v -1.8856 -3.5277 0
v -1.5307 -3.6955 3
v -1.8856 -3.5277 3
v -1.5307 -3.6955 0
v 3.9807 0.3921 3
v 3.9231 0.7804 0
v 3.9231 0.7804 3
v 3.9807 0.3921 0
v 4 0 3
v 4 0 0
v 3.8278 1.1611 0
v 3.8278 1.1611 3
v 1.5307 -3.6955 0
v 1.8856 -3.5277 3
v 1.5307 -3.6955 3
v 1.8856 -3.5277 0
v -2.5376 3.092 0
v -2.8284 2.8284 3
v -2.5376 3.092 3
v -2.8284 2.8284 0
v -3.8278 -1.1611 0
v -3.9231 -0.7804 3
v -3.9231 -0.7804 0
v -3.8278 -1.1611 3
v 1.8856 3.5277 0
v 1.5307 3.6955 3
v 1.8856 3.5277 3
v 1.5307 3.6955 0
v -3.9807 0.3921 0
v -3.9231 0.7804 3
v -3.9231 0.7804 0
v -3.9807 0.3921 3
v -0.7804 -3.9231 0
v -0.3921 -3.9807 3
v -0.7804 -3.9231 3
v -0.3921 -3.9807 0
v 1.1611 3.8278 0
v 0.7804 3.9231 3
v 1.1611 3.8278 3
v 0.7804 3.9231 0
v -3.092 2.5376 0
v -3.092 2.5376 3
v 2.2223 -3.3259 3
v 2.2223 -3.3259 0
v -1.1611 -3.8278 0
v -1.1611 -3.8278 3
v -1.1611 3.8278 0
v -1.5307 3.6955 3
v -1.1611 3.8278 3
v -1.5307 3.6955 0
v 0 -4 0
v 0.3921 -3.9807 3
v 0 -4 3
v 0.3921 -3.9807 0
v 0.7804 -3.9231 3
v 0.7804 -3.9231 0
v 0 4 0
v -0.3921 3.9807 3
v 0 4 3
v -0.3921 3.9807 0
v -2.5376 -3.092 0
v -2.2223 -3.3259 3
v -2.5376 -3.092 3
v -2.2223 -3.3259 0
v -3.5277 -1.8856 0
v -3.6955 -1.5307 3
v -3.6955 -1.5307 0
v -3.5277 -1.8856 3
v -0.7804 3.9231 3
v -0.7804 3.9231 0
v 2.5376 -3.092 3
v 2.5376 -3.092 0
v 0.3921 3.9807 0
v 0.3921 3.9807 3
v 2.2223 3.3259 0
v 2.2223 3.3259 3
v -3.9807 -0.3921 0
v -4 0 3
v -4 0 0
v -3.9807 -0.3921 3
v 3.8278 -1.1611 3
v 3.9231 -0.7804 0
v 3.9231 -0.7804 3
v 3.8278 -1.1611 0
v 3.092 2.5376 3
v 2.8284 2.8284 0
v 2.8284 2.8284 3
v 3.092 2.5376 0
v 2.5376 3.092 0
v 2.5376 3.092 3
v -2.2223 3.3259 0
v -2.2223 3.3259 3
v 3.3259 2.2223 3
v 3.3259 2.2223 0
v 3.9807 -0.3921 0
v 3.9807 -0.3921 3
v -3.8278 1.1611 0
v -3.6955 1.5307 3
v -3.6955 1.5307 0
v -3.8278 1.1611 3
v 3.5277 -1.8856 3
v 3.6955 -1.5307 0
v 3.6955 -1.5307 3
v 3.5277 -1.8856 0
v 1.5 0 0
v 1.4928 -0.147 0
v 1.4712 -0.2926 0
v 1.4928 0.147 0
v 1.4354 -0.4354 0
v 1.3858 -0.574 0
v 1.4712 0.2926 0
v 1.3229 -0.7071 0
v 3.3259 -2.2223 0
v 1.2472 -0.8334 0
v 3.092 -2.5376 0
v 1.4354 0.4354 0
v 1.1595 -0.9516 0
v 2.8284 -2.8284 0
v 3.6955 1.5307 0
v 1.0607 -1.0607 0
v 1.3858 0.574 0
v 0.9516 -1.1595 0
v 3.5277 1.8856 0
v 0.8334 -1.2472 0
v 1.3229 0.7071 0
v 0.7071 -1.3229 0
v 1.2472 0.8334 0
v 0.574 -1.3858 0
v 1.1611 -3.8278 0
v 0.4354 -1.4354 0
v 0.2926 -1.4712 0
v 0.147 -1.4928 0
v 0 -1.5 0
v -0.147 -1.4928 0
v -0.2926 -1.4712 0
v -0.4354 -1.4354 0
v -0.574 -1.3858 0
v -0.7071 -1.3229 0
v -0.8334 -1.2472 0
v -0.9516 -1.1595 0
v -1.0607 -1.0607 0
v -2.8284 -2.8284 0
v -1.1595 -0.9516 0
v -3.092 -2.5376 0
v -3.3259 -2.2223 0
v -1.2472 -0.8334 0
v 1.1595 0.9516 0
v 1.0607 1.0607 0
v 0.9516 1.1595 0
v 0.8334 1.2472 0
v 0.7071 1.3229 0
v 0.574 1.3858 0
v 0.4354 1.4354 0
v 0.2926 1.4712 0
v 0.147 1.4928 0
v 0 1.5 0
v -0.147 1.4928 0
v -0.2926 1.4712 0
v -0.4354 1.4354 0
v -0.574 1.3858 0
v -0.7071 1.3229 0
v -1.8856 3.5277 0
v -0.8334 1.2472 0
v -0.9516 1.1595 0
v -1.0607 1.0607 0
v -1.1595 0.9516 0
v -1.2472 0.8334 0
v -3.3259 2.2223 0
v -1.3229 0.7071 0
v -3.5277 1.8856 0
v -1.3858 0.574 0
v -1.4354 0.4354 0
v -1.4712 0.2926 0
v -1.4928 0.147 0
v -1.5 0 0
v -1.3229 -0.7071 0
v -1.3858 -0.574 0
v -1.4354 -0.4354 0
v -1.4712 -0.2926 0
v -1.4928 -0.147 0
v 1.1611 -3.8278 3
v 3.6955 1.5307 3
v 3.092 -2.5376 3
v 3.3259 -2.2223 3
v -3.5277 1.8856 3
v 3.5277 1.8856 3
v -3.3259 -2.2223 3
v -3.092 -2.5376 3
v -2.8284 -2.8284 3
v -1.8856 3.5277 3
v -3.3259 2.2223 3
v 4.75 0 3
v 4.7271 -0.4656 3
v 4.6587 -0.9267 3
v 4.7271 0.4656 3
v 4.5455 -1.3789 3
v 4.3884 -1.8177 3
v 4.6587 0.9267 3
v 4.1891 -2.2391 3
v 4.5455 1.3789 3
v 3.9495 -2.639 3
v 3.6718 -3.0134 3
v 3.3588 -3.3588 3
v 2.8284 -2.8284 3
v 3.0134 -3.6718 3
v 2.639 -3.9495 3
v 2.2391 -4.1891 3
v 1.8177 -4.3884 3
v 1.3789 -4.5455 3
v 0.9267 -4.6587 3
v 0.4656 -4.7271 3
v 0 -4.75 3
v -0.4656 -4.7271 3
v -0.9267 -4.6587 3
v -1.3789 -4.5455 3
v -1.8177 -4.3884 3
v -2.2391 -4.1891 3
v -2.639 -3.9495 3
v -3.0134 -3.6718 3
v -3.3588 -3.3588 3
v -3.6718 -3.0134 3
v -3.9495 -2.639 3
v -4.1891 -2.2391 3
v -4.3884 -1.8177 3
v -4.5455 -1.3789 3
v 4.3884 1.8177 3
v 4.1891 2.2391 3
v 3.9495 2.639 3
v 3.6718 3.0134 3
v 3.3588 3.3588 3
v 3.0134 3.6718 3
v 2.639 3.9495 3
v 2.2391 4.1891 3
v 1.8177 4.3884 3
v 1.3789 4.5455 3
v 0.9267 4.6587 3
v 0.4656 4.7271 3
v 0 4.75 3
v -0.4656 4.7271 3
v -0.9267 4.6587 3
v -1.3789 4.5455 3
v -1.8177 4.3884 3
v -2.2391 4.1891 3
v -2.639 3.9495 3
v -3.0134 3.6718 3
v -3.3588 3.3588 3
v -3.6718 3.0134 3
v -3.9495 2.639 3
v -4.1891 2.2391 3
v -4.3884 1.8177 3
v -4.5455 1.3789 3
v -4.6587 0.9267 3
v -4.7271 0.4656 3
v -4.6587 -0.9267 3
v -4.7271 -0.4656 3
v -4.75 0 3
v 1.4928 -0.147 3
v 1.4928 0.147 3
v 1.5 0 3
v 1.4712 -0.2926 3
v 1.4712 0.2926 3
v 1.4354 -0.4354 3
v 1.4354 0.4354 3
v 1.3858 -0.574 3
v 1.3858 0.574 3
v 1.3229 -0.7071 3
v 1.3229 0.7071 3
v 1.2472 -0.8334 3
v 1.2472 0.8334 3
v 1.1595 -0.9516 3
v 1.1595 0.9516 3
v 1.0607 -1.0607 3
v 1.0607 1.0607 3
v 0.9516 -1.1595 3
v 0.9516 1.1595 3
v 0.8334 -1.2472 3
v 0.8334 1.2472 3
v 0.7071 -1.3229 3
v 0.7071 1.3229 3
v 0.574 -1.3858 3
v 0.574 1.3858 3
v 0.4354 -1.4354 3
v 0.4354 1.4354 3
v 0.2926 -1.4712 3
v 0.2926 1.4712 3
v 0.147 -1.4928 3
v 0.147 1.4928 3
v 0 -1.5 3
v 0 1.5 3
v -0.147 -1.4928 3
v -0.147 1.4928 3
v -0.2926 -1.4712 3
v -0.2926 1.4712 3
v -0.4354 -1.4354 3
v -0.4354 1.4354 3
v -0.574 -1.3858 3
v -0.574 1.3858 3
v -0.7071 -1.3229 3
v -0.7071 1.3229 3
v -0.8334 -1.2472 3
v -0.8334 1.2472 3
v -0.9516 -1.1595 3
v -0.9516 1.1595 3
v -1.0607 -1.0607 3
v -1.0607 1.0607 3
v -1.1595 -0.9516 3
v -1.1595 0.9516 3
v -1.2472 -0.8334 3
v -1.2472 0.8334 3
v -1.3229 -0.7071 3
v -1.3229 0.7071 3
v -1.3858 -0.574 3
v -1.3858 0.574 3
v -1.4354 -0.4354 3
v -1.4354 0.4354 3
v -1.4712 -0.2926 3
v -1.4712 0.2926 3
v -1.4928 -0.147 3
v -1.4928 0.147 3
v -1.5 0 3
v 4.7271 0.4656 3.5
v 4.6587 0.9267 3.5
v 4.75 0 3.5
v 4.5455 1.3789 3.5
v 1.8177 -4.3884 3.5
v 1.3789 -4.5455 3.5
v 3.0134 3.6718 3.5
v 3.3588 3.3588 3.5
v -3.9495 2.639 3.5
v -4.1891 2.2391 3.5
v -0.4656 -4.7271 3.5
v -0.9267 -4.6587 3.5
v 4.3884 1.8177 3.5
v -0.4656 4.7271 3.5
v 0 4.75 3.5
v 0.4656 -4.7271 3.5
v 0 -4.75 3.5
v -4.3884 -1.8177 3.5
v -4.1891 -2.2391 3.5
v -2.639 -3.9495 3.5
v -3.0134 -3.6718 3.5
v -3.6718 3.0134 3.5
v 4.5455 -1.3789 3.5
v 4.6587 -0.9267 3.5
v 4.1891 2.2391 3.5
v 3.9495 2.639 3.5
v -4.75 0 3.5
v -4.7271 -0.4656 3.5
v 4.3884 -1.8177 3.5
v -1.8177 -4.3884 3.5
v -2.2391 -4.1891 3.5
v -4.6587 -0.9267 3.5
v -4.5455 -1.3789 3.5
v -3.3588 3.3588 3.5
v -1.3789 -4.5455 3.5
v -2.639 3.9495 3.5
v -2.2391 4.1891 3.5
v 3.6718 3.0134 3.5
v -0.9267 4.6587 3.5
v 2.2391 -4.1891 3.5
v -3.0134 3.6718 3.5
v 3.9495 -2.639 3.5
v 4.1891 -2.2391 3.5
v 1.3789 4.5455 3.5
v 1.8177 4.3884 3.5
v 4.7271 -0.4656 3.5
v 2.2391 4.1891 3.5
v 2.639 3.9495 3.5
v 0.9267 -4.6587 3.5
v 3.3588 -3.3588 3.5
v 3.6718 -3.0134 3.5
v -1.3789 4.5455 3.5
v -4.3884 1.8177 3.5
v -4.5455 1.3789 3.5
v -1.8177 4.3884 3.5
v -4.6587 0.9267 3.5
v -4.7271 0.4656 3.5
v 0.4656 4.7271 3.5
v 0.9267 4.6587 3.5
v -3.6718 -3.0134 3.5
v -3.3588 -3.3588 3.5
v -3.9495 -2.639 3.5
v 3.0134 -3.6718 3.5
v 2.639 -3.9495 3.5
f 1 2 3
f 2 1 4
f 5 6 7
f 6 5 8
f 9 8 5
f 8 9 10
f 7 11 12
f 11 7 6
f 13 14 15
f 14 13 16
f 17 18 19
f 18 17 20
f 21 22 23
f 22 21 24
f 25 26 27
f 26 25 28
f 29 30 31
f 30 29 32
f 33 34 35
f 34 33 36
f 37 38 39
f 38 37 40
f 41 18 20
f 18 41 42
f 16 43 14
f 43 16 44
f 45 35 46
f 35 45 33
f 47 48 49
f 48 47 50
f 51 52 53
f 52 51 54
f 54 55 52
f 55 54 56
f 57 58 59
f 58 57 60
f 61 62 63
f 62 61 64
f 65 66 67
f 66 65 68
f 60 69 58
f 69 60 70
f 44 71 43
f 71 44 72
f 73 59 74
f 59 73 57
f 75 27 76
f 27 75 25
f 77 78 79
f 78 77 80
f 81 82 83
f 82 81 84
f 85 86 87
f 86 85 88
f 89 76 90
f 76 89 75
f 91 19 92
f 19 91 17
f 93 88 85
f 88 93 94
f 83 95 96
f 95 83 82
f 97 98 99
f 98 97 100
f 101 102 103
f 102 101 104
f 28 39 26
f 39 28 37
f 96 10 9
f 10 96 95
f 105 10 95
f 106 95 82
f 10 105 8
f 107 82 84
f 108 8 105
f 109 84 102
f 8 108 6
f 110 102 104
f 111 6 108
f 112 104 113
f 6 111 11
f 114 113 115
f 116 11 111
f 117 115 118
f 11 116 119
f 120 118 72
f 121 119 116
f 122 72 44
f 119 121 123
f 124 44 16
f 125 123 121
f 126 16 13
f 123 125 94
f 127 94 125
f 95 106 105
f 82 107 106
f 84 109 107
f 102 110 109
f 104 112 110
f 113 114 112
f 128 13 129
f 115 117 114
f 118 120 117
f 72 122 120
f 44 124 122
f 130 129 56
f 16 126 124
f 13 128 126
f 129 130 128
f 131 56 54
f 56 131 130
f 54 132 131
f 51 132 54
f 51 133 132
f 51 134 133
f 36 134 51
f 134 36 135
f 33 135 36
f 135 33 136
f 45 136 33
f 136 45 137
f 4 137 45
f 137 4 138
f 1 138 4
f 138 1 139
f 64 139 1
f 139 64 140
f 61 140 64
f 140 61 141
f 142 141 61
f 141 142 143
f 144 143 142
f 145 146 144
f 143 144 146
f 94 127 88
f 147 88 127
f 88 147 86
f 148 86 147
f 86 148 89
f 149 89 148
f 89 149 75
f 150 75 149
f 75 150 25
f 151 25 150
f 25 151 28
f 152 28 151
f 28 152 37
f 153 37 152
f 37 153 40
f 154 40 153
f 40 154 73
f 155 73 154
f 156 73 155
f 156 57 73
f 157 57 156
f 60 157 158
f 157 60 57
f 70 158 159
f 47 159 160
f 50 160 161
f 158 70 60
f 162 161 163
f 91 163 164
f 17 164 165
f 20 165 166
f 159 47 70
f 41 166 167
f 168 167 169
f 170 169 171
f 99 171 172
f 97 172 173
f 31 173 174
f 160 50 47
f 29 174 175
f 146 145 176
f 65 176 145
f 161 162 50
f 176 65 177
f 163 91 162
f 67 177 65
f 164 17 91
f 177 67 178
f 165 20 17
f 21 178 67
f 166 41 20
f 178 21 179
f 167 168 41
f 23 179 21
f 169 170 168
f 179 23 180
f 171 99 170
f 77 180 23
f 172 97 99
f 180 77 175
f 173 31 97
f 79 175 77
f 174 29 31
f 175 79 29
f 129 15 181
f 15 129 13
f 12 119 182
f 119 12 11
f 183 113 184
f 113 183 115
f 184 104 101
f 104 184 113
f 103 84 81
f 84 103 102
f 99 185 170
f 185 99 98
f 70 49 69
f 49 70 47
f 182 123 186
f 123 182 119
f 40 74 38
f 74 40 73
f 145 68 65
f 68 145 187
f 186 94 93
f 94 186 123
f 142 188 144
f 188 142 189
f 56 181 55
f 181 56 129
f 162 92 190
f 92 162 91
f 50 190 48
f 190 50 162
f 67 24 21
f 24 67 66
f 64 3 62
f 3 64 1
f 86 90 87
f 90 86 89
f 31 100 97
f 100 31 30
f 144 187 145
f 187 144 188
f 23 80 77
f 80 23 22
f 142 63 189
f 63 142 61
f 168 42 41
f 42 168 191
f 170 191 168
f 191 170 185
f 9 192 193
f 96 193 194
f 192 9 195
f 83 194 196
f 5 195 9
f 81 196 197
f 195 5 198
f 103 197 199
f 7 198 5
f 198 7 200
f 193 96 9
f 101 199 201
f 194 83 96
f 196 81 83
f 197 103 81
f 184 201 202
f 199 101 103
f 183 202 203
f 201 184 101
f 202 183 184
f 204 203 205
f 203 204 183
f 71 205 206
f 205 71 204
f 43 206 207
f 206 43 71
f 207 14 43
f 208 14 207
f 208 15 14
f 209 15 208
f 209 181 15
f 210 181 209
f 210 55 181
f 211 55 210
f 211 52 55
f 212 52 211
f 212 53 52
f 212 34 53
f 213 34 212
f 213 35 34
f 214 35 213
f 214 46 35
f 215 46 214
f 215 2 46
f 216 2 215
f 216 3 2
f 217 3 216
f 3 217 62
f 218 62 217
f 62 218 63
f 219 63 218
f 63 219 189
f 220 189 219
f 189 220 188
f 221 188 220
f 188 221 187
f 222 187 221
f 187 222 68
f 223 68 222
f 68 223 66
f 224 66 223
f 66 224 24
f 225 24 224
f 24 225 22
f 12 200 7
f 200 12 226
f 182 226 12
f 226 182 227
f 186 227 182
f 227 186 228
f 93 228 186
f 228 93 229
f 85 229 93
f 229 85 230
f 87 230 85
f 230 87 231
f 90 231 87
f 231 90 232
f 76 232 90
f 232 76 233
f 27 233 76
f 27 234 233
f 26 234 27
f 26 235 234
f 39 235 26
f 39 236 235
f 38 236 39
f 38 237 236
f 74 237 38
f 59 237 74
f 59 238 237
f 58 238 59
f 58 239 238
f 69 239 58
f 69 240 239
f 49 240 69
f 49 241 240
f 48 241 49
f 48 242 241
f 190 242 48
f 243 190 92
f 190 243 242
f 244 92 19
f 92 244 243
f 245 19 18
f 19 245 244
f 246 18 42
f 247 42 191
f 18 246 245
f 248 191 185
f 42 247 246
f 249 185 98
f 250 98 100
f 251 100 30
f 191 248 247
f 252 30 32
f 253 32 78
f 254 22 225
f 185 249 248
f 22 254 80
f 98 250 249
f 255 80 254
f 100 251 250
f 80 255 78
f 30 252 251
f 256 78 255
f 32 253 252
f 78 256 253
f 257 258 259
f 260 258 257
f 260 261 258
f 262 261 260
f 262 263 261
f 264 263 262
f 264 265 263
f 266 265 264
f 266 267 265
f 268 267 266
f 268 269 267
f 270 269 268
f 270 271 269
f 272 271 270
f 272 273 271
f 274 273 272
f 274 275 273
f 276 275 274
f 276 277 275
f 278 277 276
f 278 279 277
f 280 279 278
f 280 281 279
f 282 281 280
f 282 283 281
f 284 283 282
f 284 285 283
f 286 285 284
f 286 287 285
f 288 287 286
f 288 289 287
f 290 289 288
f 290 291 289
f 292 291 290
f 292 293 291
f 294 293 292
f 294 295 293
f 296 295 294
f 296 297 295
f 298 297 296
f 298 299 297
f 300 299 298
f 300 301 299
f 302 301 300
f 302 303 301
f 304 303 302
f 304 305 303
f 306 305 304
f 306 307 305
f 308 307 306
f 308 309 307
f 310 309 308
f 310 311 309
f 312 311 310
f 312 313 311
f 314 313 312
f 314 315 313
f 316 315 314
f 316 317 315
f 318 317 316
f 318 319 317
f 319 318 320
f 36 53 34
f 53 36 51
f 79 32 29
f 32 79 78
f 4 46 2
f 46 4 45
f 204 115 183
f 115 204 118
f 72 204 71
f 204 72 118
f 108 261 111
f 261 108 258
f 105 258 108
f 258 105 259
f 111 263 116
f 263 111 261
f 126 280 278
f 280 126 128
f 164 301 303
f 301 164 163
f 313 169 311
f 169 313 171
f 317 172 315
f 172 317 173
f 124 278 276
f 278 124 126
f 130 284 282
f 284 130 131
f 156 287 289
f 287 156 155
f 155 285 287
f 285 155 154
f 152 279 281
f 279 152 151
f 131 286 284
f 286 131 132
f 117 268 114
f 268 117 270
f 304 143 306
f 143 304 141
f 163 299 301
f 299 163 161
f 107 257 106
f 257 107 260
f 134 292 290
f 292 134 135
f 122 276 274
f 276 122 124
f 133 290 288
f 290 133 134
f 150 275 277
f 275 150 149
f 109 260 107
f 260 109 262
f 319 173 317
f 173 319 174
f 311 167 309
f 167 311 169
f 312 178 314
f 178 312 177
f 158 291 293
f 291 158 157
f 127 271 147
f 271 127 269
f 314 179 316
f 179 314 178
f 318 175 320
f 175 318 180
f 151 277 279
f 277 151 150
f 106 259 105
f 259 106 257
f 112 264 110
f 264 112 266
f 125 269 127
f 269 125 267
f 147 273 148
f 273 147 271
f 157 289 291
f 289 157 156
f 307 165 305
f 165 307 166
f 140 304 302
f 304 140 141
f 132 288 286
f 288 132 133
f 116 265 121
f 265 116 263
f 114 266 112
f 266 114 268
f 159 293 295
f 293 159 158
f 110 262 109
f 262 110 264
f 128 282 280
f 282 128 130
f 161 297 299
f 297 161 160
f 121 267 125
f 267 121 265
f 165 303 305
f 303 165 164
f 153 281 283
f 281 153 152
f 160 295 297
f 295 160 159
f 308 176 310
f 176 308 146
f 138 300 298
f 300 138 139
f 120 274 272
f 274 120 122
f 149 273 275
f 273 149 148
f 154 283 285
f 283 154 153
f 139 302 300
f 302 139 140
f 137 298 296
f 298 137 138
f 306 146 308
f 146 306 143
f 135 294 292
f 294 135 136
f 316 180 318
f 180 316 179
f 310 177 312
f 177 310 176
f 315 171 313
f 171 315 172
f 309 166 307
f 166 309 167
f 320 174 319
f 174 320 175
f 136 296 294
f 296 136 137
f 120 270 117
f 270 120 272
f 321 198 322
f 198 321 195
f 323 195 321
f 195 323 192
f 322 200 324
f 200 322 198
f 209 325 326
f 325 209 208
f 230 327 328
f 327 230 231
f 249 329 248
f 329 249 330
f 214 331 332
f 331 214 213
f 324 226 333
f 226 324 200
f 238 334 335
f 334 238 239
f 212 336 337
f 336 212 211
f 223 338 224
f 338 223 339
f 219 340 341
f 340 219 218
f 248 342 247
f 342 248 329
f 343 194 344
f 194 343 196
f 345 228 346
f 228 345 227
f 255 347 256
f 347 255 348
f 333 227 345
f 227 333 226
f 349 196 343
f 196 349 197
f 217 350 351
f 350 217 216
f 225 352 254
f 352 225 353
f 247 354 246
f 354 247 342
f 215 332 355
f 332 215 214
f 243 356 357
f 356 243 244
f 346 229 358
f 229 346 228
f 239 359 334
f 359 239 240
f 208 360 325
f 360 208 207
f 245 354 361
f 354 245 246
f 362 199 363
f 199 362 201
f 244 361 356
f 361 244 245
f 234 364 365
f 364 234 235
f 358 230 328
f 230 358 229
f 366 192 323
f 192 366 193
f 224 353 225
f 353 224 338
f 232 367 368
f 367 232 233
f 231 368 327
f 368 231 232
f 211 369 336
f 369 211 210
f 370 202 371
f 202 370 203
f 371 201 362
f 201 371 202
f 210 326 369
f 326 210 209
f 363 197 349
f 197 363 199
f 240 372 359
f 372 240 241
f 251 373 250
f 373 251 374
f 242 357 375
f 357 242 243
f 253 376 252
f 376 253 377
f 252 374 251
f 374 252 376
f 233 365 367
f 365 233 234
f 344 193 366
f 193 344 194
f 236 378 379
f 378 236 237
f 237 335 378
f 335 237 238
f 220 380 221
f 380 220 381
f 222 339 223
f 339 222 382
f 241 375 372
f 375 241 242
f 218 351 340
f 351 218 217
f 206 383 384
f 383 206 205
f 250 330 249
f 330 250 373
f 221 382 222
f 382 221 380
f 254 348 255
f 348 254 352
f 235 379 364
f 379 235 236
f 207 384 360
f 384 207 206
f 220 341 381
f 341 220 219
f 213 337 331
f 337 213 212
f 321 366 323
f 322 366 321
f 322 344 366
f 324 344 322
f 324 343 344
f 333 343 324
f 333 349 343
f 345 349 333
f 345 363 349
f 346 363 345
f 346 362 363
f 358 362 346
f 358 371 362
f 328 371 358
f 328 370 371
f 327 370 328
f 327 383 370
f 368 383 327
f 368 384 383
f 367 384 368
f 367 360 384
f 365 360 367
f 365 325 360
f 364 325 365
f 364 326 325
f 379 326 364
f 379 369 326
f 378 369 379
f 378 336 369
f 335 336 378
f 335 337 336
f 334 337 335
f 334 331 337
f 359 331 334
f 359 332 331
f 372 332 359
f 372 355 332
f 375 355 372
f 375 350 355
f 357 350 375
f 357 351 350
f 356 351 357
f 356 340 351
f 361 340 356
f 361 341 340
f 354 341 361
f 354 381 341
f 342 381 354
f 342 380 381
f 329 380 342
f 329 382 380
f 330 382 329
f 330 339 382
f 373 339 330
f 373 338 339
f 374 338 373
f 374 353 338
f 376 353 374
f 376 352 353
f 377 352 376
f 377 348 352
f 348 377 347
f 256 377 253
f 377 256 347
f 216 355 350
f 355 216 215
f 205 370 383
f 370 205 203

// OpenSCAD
module flanged_ball_bearing() {
    difference() {
        // Outer cylinder of the bearing
        cylinder(h=3.0, d=8.0, $fn=64);
        
        // Inner bore
        translate([0, 0, -1])
            cylinder(h=5.0, d=3.0, $fn=64);
    }
    
    // Flange
    translate([0, 0, 3.0])
        cylinder(h=0.5, d=9.5, $fn=64);
}

flanged_ball_bearing();
